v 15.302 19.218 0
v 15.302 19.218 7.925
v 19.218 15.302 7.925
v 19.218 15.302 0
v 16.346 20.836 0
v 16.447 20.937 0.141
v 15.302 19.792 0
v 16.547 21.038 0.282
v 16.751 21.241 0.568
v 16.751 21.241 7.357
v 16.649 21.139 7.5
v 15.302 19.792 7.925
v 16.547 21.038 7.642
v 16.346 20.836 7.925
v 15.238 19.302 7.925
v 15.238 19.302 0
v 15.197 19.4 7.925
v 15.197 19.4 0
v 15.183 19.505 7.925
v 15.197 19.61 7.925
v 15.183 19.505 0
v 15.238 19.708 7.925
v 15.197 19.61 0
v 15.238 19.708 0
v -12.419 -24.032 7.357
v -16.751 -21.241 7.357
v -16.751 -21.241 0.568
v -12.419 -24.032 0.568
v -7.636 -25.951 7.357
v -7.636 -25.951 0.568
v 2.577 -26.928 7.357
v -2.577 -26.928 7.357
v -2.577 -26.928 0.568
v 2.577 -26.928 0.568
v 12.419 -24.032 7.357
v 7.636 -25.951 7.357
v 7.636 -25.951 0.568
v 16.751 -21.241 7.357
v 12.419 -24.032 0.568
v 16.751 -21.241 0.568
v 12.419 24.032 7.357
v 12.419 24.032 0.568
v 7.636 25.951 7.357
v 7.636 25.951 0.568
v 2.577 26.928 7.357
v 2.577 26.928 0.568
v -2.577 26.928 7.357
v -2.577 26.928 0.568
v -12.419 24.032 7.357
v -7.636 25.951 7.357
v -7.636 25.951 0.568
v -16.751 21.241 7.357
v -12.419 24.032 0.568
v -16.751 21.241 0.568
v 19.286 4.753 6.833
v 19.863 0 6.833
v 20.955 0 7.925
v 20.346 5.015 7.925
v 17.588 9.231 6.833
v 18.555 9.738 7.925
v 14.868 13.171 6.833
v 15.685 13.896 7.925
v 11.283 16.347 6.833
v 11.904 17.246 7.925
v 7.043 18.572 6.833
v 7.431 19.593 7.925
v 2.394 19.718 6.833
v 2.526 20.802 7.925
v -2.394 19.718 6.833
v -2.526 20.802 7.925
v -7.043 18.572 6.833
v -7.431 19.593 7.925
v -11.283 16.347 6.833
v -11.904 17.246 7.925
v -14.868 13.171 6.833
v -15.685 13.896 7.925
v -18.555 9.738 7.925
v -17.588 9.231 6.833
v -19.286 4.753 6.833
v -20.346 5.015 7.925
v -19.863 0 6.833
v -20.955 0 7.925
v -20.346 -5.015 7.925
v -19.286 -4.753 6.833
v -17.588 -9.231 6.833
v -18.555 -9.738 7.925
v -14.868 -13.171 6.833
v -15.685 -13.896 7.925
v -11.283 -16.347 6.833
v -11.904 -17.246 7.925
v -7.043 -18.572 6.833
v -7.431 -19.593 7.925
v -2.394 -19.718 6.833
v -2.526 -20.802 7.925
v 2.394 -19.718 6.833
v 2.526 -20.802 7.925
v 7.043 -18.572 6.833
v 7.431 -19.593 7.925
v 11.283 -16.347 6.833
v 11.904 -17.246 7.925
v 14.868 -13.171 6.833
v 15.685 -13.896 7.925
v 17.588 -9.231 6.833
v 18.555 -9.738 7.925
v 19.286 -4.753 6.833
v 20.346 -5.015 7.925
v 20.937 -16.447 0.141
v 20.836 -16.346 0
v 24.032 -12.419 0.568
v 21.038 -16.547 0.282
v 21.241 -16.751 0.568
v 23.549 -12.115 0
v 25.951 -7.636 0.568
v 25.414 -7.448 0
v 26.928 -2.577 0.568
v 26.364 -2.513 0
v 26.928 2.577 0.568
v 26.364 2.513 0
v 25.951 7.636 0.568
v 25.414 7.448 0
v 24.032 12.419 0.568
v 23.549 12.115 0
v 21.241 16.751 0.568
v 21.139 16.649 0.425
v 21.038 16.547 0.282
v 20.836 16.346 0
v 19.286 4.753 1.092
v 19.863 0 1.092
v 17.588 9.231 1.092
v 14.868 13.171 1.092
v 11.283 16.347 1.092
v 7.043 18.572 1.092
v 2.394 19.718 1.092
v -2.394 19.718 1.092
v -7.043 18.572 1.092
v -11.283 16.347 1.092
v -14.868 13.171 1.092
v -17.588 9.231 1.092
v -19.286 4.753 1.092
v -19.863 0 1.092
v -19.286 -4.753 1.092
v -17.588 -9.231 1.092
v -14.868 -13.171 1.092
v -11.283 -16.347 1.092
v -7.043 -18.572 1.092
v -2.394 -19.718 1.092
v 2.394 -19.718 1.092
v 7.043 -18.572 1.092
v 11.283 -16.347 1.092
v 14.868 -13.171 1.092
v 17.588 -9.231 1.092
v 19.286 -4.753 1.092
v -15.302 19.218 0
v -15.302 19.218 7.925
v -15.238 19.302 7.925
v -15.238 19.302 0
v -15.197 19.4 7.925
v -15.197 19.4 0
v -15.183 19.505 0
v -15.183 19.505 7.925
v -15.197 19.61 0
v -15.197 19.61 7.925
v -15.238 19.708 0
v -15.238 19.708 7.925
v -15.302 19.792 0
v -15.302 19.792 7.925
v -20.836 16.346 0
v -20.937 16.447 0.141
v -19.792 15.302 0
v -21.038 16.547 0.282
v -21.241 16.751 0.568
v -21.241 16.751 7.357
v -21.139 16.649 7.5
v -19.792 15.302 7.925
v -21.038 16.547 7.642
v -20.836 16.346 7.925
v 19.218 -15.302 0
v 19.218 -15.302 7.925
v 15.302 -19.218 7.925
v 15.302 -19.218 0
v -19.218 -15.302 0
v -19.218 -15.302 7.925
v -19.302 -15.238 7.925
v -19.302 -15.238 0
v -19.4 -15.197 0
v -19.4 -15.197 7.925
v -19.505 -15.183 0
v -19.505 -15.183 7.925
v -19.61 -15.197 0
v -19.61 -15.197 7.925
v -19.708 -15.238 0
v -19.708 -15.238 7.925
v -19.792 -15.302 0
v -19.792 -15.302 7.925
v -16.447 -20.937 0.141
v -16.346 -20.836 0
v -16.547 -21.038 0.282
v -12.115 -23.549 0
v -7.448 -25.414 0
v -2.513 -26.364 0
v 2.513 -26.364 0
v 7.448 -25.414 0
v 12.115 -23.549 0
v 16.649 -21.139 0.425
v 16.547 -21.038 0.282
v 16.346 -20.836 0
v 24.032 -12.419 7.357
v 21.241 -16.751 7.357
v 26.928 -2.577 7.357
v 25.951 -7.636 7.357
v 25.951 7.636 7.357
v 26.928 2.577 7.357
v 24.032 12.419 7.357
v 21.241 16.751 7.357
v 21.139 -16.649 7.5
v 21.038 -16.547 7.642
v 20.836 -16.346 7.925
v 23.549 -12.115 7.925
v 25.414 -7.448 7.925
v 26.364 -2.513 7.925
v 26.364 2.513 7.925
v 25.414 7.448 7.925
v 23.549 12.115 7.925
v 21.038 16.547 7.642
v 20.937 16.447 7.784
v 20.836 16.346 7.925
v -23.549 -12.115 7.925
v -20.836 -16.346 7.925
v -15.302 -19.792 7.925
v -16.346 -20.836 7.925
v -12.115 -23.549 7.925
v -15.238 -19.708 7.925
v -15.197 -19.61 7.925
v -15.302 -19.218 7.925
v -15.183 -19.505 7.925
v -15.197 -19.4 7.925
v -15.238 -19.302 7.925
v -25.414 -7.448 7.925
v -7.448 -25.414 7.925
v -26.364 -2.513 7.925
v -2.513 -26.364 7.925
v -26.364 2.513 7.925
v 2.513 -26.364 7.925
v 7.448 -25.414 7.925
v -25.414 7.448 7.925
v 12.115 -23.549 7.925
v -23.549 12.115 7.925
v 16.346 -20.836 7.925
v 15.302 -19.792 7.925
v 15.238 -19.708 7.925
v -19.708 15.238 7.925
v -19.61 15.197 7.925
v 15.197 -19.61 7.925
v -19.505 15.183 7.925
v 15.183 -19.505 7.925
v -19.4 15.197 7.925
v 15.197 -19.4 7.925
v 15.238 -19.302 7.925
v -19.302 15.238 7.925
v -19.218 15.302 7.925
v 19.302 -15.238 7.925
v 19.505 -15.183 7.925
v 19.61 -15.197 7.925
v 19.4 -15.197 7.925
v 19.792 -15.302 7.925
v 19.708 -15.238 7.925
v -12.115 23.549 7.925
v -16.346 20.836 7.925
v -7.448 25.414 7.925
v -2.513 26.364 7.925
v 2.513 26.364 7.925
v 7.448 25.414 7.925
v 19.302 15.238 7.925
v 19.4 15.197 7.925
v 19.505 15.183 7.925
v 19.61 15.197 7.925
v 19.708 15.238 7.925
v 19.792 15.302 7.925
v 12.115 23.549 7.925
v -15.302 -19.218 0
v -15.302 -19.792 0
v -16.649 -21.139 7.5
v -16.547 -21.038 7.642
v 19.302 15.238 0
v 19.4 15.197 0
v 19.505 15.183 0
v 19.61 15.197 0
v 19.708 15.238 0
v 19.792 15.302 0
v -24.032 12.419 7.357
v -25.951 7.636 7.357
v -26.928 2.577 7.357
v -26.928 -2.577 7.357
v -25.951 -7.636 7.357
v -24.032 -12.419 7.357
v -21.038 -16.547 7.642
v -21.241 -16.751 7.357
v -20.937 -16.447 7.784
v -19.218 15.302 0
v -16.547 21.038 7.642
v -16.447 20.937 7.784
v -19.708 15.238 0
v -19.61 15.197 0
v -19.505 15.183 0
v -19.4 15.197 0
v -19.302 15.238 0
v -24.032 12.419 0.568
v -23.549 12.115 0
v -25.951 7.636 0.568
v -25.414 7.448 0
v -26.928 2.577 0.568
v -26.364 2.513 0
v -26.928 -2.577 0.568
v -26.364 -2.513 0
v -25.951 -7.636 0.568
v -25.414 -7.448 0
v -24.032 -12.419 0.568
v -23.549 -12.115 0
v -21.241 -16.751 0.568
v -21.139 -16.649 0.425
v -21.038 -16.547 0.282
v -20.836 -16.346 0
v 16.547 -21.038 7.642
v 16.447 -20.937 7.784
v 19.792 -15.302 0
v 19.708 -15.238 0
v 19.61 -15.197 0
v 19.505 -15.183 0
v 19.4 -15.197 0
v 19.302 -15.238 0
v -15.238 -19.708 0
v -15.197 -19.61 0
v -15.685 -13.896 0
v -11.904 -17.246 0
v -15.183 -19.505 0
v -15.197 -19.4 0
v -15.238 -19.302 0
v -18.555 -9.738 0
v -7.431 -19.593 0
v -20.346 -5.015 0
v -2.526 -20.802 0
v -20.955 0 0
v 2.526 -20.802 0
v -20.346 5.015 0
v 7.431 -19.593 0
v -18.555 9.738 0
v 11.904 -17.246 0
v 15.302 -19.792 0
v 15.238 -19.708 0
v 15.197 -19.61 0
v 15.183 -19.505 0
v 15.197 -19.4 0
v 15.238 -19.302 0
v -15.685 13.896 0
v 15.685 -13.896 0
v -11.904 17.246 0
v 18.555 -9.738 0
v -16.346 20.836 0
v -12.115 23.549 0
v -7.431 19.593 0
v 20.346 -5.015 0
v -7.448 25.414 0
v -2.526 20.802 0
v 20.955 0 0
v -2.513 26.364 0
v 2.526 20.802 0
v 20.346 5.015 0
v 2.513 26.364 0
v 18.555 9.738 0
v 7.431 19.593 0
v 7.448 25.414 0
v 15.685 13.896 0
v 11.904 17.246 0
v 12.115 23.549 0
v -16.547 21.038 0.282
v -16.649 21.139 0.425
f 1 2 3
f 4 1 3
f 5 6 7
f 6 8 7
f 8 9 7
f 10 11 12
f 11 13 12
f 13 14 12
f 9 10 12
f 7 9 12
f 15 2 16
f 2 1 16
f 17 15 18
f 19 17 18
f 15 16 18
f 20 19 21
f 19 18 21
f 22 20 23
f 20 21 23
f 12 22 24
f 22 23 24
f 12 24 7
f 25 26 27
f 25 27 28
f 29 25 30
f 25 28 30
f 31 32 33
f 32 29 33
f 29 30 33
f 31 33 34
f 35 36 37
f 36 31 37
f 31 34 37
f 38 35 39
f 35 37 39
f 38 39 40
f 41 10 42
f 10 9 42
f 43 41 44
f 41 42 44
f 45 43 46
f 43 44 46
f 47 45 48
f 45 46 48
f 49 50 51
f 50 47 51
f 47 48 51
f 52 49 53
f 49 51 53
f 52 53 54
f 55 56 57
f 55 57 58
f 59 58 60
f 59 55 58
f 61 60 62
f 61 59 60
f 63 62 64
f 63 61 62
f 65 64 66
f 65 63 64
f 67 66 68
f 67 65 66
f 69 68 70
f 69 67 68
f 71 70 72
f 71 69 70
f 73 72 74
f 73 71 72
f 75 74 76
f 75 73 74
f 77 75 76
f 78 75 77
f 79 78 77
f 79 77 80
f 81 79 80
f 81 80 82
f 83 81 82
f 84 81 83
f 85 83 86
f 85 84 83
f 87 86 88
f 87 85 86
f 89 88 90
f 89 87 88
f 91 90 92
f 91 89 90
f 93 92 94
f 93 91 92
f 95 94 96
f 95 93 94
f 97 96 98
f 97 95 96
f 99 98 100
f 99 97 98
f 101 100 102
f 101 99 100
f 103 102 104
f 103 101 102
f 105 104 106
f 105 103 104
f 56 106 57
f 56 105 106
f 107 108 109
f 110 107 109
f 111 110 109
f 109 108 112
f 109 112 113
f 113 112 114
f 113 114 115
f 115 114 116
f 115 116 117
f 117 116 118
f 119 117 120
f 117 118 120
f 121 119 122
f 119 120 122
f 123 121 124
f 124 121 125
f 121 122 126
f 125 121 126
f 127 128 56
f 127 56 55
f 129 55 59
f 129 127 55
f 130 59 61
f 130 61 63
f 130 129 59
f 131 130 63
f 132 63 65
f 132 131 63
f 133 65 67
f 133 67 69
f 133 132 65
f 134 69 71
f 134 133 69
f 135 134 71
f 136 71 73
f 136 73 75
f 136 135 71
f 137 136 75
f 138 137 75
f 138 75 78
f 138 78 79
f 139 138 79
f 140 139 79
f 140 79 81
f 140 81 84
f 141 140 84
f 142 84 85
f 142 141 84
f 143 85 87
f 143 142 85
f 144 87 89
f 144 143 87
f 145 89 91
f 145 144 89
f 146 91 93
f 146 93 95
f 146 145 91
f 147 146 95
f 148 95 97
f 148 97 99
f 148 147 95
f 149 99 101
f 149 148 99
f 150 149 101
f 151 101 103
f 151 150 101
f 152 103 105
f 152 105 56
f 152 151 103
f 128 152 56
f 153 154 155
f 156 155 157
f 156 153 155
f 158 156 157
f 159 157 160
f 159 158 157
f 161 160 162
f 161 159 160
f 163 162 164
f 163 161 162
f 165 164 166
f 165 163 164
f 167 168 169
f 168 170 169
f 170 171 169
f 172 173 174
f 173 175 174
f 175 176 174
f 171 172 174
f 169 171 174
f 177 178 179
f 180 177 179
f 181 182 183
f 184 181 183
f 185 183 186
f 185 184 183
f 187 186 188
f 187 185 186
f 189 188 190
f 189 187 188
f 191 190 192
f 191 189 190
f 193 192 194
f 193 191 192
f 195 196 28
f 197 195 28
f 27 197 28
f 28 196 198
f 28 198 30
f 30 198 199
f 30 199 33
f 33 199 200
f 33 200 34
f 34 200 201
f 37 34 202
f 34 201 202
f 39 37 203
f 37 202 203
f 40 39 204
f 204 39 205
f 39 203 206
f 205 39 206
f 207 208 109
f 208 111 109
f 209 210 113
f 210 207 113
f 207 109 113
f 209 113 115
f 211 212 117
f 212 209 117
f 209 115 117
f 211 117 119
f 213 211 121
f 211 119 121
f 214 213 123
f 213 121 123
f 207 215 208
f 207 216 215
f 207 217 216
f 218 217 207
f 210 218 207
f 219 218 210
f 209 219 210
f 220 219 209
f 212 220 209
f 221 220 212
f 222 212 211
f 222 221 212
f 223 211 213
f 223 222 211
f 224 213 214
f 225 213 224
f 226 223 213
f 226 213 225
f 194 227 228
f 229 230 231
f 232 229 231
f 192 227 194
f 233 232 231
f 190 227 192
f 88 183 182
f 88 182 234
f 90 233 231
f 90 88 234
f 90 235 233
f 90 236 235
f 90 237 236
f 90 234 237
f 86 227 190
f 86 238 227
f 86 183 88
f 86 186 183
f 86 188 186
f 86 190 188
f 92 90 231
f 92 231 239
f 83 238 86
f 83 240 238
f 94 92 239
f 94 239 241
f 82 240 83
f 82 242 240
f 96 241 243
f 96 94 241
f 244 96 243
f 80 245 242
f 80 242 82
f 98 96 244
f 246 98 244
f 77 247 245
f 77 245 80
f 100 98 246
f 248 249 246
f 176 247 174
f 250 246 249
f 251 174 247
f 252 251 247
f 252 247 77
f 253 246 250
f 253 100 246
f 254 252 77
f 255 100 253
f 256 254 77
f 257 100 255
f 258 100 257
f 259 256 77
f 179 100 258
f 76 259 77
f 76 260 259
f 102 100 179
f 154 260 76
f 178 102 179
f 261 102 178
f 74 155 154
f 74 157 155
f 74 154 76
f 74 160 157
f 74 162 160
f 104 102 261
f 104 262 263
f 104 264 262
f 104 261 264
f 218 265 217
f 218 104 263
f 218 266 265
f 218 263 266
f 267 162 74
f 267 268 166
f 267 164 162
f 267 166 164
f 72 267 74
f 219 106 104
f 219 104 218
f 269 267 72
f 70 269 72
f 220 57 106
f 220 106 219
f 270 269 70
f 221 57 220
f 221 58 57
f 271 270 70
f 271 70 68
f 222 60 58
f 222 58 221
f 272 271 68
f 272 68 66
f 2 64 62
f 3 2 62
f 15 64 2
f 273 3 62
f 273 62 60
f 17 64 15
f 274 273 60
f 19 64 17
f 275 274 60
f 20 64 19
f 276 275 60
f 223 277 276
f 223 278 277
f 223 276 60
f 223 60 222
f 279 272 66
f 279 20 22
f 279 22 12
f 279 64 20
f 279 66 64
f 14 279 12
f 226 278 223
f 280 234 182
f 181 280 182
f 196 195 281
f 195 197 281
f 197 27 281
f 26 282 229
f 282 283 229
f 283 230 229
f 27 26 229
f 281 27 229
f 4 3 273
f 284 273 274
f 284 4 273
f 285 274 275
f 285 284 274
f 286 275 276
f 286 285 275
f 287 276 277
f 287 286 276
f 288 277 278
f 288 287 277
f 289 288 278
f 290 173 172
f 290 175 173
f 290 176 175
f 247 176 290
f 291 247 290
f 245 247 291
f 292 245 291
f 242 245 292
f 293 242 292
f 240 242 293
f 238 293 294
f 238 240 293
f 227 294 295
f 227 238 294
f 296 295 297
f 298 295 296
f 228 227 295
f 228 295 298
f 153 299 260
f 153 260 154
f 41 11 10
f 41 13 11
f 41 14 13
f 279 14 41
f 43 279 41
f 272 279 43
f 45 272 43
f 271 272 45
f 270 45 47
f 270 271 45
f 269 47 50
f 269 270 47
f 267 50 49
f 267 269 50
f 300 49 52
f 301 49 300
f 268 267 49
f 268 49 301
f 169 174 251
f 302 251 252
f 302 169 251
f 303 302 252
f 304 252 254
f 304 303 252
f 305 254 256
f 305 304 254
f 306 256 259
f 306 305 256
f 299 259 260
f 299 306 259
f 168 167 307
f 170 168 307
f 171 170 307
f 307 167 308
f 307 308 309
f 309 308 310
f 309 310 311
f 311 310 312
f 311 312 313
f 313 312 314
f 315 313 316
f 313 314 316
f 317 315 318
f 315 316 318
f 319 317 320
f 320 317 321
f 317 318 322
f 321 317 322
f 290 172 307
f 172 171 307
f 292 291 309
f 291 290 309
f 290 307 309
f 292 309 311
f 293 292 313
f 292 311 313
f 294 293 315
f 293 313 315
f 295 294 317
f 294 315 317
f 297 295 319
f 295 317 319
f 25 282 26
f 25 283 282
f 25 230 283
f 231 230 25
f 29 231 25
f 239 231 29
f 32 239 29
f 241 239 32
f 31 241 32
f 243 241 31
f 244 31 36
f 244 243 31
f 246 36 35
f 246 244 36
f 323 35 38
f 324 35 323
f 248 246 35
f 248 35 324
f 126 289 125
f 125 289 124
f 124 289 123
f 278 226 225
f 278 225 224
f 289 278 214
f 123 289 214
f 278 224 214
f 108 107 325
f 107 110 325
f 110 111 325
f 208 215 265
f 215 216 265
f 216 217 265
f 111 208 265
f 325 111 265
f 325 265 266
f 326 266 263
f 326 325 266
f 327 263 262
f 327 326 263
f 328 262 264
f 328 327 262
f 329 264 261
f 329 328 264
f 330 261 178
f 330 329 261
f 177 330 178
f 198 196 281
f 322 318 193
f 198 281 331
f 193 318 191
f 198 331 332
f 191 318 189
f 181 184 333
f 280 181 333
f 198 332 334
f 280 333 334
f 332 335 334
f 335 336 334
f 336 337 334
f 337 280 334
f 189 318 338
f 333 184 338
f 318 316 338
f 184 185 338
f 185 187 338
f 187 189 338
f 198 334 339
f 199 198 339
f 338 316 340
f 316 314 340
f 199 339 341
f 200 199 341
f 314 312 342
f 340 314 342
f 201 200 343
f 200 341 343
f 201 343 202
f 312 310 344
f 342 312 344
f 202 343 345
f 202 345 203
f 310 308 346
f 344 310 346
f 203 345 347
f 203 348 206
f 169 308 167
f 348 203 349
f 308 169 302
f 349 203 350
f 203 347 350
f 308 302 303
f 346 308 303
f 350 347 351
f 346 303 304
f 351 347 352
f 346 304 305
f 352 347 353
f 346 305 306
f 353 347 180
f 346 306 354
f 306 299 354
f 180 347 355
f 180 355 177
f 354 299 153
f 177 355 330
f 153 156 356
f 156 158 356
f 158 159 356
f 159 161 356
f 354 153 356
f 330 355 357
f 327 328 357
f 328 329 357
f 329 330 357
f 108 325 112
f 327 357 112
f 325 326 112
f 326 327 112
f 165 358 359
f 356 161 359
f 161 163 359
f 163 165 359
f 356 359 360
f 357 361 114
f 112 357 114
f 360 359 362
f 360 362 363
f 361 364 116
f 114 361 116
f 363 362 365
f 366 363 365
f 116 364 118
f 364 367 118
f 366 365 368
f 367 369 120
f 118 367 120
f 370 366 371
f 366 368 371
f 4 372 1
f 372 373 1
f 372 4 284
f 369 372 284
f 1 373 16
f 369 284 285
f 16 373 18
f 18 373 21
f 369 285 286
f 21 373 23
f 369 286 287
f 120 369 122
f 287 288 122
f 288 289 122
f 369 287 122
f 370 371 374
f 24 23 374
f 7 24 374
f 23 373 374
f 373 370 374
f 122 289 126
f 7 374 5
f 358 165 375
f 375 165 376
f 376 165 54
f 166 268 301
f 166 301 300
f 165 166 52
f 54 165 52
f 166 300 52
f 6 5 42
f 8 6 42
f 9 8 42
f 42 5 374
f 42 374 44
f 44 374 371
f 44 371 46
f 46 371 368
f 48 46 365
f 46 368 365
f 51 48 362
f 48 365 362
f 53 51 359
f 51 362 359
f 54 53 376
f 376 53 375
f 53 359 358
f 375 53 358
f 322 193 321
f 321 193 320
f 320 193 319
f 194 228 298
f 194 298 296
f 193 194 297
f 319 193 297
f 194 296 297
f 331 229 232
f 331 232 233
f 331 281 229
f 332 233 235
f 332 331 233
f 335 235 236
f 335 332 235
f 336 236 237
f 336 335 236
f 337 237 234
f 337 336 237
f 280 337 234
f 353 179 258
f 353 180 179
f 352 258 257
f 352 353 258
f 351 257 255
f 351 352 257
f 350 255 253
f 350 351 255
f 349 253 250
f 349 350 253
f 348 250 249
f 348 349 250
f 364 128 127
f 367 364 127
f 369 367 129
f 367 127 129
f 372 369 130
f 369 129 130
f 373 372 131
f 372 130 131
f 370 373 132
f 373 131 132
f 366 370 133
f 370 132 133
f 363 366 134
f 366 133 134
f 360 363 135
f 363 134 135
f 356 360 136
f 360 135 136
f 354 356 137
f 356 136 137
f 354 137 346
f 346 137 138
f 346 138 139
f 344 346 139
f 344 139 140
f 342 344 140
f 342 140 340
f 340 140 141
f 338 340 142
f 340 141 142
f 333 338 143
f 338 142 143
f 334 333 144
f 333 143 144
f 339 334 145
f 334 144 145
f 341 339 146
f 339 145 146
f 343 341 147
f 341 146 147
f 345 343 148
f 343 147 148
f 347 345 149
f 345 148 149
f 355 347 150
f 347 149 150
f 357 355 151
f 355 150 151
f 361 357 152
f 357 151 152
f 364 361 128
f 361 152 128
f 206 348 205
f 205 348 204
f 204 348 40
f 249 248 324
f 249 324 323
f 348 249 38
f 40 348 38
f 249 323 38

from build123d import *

# Parameters (mm, degrees)
SKETCH1_R                = 27.051
SKETCH1_R_2              = 19.8628
EXTRUDE1_DEPTH           = 7.9248
CHAMFER1_SIZE            = 0.567944
CHAMFER2_SIZE            = 1.0922
CUT_EXTRUDE1_DEPTH       = 8.9248
FILLET1_R                = 0.4064
CIRPATTERN1_COUNT        = 4
FILLET1_OF_CIRPATTERN1_R = 0.4064


with BuildPart() as part:
    # Sketch1 → Extrude1 (new body)
    with BuildSketch(Plane.XY):
        Circle(SKETCH1_R)
        Circle(SKETCH1_R_2, mode=Mode.SUBTRACT)
    extrude(amount=EXTRUDE1_DEPTH)

    # Chamfer1
    chamfer1_edges = [part.edges().sort_by_distance(p)[0] for p in [
        (-27.051, 0, 0),
        (-27.051, 0, 7.9248),
    ]]
    chamfer(chamfer1_edges, length=CHAMFER1_SIZE)

    # Chamfer2
    chamfer2_edges = [part.edges().sort_by_distance(p)[0] for p in [
        (-19.8628, 0, 0),
        (-19.8628, 0, 7.9248),
    ]]
    chamfer(chamfer2_edges, length=CHAMFER2_SIZE)

    # Sketch2 → Cut-Extrude1 (cut, through all)
    with BuildSketch(Plane.XY.offset(7.9248)):
        with BuildLine():
            Line((16.750672018, 21.240800078), (15.014988234, 19.505116295))
            Line((15.014988234, 19.505116295), (19.505116295, 15.014988234))
            Line((19.505116295, 15.014988234), (21.240800078, 16.750672018))
            ThreePointArc((21.240800078, 16.750672018), (19.127945538, 19.127945538), (16.750672018, 21.240800078))
        make_face()
    cut_extrude1 = extrude(amount=-CUT_EXTRUDE1_DEPTH, mode=Mode.SUBTRACT)

    # Fillet1
    fillet1_edges = [part.edges().sort_by_distance(p)[0] for p in [
        (19.505116295, 15.014988234, 3.9624),
        (15.014988234, 19.505116295, 3.9624),
    ]]
    fillet(fillet1_edges, radius=FILLET1_R)

    # CirPattern1: Cut-Extrude1 ×4 about axis
    cirpattern1_axis = Axis((0, 0, 0), (0, 0, 1))
    for i in range(1, CIRPATTERN1_COUNT):
        add(cut_extrude1.rotate(cirpattern1_axis, i * 360 / CIRPATTERN1_COUNT), mode=Mode.SUBTRACT)

    # Fillet1 of CirPattern1
    fillet1_of_cirpattern1_edges = [part.edges().sort_by_distance(p)[0] for p in [
        (-15.014988234, 19.505116295, 3.9624),
        (-19.505116295, 15.014988234, 3.9624),
        (-19.505116295, -15.014988234, 3.9624),
        (-15.014988234, -19.505116295, 3.9624),
        (15.014988234, -19.505116295, 3.9624),
        (19.505116295, -15.014988234, 3.9624),
    ]]
    fillet(fillet1_of_cirpattern1_edges, radius=FILLET1_OF_CIRPATTERN1_R)


solid = part.part
